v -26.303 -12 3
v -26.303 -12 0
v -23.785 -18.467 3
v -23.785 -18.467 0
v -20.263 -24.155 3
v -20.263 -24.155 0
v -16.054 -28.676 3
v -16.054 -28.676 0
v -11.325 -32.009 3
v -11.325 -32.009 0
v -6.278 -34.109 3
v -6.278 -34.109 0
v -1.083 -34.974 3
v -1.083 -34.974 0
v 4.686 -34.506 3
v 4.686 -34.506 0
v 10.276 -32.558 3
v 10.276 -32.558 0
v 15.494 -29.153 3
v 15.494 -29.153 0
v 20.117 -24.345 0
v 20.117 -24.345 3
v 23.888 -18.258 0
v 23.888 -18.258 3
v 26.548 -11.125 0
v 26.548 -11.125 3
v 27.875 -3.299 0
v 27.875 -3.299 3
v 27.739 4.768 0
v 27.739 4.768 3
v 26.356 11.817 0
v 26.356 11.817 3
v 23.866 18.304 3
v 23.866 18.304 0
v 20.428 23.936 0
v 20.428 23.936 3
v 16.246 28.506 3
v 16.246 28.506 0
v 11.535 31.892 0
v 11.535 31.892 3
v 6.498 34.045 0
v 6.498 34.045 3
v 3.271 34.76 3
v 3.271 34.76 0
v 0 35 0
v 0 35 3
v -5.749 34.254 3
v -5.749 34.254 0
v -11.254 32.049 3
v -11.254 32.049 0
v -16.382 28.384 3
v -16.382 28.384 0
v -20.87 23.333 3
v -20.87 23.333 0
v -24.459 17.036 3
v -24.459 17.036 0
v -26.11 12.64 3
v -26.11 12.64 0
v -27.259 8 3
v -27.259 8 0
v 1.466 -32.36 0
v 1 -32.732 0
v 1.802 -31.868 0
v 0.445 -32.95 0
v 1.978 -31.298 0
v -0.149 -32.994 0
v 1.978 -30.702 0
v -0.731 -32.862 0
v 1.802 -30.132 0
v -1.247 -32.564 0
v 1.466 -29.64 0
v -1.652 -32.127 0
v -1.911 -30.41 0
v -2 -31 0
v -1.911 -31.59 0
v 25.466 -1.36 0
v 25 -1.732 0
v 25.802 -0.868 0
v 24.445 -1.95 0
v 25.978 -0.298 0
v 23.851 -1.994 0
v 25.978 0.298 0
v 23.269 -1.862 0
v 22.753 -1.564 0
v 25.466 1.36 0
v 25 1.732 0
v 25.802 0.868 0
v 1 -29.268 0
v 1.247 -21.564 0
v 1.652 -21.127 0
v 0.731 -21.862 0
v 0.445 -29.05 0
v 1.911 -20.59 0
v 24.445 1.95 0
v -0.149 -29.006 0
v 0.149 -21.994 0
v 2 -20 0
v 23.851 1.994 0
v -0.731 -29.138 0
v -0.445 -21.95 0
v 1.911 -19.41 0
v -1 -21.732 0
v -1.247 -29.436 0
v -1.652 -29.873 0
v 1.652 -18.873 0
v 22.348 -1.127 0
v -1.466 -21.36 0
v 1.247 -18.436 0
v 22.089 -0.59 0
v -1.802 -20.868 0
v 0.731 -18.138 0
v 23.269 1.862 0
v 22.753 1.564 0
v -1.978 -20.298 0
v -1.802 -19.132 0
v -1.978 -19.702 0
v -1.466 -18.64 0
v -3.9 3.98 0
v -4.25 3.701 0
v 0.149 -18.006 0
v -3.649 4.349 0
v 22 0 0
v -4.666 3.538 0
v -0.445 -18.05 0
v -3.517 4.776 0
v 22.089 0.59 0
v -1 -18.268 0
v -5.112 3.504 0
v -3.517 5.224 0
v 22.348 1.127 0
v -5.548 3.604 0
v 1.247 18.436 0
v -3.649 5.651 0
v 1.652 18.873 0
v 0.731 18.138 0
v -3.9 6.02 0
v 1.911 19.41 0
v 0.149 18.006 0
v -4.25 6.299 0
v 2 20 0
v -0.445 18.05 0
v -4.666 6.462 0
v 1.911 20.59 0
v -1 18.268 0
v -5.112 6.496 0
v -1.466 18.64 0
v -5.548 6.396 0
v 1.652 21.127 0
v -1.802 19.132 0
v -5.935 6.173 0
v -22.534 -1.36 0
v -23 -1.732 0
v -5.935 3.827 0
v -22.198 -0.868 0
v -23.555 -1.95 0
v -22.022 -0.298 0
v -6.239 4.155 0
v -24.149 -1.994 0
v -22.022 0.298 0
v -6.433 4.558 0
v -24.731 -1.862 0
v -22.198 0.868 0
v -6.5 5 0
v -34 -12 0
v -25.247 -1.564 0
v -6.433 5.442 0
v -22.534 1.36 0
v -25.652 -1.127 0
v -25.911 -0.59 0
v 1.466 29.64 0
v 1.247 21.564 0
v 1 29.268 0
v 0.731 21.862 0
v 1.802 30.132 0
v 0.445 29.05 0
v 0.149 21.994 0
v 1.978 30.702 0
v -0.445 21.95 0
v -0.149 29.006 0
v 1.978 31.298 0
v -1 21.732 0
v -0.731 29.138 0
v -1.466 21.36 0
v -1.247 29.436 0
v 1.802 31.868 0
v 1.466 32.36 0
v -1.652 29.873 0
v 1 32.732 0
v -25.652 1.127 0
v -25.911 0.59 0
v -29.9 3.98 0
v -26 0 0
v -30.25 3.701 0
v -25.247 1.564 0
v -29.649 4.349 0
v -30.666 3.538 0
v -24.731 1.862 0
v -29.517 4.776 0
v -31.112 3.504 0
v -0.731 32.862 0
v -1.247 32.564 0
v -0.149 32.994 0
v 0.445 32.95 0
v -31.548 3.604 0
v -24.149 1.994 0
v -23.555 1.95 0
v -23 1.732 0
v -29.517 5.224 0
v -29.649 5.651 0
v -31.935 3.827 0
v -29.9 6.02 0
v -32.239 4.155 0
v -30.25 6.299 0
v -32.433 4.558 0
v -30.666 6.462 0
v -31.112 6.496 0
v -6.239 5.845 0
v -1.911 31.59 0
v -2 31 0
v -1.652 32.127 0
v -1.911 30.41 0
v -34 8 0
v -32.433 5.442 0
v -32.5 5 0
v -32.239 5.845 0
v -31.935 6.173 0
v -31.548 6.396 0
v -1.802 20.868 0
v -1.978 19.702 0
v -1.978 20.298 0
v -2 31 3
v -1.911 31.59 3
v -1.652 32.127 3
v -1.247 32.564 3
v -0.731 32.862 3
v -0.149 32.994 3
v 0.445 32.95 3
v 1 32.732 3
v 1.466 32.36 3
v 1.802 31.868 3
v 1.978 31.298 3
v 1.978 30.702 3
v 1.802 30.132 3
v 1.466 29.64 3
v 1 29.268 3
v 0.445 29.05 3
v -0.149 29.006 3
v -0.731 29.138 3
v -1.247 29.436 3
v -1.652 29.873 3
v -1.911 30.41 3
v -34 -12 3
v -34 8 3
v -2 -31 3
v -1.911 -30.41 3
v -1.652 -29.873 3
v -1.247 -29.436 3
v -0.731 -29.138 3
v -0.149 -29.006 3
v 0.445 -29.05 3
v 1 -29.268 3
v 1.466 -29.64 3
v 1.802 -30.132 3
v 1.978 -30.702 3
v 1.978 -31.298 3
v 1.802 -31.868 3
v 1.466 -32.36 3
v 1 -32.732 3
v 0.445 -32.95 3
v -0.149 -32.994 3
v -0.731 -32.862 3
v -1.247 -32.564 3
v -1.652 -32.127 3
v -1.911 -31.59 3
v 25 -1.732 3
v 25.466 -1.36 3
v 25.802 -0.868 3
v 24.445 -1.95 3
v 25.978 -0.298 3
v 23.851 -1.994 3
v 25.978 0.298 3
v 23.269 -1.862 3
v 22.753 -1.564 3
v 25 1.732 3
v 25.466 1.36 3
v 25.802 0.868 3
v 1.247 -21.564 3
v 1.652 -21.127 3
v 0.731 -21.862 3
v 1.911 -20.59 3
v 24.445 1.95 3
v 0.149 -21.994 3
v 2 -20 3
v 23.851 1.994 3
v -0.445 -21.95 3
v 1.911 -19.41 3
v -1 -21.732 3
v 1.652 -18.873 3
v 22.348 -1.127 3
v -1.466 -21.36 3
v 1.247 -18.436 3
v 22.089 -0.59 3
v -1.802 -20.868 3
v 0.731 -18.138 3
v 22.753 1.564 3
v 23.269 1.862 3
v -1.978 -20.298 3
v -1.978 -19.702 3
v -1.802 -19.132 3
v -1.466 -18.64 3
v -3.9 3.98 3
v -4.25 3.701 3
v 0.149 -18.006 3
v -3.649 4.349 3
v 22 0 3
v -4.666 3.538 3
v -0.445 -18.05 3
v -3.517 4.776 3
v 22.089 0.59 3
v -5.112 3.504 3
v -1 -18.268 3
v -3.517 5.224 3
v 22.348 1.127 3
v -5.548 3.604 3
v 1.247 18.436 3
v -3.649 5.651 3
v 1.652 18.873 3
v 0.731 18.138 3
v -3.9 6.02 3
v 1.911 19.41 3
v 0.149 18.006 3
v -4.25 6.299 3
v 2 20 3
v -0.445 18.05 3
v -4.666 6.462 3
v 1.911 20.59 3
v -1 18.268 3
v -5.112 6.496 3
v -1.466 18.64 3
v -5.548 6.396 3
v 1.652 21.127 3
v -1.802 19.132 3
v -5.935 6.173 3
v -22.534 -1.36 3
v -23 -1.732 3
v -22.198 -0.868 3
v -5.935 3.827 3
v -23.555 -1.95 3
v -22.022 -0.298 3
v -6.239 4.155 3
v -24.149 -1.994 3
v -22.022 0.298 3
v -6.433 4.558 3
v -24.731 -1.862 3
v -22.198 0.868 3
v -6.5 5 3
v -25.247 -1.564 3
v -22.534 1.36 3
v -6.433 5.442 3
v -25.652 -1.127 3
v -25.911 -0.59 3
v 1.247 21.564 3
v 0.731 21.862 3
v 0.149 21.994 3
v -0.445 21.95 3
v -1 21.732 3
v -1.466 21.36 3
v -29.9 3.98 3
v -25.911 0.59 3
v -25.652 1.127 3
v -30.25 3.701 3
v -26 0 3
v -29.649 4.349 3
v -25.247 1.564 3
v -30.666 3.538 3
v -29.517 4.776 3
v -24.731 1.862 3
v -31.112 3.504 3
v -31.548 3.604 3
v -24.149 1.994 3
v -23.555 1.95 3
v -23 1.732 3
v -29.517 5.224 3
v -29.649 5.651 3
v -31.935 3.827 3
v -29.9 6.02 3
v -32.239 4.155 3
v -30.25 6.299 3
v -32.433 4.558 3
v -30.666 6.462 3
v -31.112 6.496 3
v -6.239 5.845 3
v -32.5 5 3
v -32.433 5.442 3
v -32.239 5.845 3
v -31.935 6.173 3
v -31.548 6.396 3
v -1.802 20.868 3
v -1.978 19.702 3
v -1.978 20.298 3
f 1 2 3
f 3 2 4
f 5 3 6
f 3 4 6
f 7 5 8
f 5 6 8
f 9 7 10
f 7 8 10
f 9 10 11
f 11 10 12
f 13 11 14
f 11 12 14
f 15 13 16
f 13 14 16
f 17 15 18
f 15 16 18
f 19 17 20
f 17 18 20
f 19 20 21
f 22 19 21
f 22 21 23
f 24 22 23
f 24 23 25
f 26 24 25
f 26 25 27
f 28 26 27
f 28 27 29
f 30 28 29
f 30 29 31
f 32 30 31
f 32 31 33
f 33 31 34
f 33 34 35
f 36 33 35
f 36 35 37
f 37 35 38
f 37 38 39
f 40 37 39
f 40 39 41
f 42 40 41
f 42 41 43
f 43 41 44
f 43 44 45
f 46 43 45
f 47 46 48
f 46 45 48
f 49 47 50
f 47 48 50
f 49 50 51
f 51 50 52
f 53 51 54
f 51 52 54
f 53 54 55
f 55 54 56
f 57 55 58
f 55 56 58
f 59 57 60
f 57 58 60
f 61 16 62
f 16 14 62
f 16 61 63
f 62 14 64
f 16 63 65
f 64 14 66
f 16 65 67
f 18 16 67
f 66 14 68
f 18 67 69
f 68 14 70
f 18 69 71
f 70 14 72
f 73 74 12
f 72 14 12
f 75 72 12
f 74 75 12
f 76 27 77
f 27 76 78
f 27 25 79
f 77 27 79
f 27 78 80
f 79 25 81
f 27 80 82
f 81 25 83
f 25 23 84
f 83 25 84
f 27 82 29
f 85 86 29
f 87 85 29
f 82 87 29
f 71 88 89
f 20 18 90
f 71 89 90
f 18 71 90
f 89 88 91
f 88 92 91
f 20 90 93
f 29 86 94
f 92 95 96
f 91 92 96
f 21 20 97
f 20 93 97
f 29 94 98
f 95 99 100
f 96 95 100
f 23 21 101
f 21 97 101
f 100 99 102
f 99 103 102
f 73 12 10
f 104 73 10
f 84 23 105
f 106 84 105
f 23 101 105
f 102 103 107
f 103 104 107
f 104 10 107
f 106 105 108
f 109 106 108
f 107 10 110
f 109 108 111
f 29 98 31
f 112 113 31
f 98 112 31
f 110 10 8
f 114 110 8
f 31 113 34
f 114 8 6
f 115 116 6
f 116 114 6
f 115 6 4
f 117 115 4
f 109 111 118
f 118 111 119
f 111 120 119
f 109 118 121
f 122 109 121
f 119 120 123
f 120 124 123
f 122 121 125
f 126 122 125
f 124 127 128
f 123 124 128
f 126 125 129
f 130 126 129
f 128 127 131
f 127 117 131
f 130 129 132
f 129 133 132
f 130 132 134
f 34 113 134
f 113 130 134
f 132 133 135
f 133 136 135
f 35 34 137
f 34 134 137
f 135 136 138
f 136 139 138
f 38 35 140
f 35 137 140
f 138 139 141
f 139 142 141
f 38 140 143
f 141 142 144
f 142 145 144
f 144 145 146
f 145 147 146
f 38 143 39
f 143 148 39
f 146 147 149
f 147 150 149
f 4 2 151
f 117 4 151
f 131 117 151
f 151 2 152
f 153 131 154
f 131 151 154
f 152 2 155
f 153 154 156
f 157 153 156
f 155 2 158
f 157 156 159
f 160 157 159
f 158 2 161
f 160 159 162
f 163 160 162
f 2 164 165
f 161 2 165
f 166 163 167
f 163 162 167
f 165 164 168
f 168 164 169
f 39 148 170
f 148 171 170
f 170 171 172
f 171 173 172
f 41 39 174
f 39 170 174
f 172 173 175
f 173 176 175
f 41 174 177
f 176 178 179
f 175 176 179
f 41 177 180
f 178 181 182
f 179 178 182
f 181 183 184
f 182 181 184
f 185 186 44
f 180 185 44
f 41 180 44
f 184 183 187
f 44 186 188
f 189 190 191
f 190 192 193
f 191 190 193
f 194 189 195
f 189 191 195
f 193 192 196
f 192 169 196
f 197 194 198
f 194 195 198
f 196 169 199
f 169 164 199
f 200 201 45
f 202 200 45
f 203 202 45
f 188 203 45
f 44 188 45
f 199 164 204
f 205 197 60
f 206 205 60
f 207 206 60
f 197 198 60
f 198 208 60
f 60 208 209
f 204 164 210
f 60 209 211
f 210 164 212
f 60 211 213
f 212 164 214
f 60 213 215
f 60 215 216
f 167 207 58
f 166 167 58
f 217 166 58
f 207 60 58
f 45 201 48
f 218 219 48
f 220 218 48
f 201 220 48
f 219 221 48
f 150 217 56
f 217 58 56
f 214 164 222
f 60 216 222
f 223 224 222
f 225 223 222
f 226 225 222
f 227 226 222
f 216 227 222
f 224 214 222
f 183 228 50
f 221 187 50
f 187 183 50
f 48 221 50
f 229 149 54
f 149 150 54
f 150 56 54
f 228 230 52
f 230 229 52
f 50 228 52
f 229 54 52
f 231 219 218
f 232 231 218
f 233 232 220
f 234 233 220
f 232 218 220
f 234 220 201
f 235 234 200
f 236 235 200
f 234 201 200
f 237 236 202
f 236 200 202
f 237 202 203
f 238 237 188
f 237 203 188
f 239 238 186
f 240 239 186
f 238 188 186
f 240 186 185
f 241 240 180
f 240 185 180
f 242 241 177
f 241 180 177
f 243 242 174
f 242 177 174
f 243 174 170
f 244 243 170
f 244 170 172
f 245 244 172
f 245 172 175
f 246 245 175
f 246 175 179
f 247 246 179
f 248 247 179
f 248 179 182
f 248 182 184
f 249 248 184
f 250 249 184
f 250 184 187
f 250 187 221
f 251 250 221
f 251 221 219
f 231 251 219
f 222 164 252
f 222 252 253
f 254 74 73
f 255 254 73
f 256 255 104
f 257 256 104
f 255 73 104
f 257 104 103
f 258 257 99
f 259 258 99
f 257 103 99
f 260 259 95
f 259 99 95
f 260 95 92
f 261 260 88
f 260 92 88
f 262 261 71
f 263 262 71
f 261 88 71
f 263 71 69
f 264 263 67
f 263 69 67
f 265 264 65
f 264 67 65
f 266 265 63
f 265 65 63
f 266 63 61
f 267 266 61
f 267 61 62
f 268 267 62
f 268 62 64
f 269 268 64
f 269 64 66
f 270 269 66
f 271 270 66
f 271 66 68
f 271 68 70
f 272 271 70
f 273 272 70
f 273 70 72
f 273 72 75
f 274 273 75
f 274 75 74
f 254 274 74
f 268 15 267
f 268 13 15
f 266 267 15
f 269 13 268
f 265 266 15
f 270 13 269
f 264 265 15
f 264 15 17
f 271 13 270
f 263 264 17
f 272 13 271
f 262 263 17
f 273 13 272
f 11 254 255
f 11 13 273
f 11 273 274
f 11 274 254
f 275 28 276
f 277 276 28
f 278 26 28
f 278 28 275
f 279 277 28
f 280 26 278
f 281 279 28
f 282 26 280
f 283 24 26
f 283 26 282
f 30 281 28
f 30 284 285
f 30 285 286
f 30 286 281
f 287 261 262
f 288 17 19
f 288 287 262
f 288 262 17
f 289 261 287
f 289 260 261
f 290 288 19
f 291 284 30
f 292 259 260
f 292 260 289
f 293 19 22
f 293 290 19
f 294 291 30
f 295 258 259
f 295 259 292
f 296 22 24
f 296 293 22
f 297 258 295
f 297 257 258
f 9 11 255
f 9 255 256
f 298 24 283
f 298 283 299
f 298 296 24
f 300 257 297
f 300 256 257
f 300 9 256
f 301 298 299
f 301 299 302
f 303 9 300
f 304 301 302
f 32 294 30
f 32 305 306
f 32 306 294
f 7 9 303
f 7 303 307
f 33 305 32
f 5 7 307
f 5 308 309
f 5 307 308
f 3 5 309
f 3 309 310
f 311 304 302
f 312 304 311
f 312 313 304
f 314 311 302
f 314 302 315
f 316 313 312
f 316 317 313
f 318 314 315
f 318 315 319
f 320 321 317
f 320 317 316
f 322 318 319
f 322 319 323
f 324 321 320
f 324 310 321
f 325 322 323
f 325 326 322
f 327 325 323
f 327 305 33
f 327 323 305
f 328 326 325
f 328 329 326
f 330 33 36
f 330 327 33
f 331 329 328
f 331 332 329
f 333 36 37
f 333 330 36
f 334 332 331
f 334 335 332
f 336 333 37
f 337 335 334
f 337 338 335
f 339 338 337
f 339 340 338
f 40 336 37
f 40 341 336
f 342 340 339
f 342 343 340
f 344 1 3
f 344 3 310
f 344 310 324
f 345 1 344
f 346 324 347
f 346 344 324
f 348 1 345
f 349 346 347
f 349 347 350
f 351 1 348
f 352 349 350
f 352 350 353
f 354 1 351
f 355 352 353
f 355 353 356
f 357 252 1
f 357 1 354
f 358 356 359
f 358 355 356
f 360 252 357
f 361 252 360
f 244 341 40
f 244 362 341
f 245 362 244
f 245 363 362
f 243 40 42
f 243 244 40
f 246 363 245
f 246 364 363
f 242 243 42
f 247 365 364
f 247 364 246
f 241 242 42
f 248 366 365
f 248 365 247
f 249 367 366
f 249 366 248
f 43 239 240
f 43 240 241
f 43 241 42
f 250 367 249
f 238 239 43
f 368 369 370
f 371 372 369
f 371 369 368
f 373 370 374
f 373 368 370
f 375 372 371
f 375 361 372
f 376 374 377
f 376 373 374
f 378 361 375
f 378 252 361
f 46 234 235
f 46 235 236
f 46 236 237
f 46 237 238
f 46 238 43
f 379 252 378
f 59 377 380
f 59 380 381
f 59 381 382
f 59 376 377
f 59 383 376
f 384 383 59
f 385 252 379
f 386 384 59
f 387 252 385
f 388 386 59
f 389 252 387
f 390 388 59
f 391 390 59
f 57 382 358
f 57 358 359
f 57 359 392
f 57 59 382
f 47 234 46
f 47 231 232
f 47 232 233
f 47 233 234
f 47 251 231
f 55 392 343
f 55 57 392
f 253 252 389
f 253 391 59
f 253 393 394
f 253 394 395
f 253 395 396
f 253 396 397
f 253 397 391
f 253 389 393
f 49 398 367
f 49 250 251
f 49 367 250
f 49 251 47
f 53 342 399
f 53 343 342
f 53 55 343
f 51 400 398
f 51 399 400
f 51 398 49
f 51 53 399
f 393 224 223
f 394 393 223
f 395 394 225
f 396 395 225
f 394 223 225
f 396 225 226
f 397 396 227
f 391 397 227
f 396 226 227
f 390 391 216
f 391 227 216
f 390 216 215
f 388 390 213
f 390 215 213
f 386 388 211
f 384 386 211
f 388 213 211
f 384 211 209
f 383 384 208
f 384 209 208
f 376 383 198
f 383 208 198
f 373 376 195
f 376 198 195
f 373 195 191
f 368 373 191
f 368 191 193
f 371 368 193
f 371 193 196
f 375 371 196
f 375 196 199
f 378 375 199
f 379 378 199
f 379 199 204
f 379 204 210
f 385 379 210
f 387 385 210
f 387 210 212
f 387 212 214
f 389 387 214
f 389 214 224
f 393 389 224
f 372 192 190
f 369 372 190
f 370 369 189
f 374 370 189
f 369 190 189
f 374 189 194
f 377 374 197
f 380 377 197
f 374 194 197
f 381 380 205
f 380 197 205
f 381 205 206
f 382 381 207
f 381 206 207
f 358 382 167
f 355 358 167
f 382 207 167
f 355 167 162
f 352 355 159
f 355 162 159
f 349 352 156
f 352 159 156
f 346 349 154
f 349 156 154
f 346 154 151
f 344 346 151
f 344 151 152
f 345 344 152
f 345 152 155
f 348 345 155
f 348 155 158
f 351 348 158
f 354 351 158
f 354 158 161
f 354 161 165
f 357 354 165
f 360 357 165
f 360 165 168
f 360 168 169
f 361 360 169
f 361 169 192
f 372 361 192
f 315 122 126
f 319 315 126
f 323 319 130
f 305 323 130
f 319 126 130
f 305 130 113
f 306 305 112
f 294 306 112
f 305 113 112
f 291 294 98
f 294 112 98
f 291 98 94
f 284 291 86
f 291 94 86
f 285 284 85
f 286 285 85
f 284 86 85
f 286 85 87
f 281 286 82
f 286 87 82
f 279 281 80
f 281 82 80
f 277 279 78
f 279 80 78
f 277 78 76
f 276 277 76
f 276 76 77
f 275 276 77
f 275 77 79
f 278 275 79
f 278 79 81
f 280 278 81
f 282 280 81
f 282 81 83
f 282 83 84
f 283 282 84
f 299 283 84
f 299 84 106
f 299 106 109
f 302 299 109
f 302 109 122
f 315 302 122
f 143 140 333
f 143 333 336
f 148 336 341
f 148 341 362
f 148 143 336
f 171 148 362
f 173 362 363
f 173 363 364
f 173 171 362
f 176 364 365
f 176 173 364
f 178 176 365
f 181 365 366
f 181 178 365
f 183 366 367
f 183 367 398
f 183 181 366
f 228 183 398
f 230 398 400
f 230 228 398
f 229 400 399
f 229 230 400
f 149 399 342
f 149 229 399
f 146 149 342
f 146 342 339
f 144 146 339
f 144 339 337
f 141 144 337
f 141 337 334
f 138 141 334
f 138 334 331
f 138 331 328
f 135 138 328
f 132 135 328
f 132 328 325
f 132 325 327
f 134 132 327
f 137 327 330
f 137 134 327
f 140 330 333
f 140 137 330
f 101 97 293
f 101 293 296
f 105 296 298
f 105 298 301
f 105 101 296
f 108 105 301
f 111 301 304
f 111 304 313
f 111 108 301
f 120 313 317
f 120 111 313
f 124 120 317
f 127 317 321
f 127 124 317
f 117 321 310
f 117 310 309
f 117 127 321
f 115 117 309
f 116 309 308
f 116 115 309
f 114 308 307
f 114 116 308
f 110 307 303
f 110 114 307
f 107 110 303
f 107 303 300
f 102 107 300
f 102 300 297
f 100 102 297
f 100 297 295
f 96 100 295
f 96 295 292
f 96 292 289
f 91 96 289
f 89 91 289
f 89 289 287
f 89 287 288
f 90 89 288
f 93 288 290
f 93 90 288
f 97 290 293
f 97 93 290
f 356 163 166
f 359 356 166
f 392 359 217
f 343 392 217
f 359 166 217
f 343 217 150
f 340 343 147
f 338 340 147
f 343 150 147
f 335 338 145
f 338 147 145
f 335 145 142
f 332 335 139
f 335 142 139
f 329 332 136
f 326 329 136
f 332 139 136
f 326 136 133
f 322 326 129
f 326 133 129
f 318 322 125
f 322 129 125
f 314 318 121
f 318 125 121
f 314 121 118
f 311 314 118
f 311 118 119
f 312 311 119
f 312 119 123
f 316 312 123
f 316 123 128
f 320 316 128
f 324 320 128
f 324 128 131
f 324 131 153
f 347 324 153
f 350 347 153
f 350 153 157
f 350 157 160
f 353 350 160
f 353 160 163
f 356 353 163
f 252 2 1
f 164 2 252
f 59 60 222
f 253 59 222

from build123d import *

# Parameters (mm, degrees)
ESQUISSE1_RX            = 35
ESQUISSE1_RY            = 28
ESQUISSE1_R             = 2
BOSS_EXTRU_1_DEPTH      = 3
ESQUISSE2_R             = 2
ENL_V_MAT_EXTRU_1_DEPTH = 10
ESQUISSE4_W             = 8
ESQUISSE4_H             = 20
BOSS_EXTRU_2_DEPTH      = 3
ESQUISSE3_R             = 1.5
ENL_V_MAT_EXTRU_2_DEPTH = 10


with BuildPart() as part:
    # Esquisse1 → Boss.-Extru.1 (new body)
    with BuildSketch(Plane.XY):
        with Locations(Location((0, 0), (0, 0, 90))):
            Ellipse(ESQUISSE1_RX, ESQUISSE1_RY)
        with Locations((0, 20)):
            Circle(ESQUISSE1_R, mode=Mode.SUBTRACT)
        with Locations((0, -20)):
            Circle(ESQUISSE1_R, mode=Mode.SUBTRACT)
    extrude(amount=BOSS_EXTRU_1_DEPTH)

    # Esquisse2 → Enlèv. mat.-Extru.1 (cut)
    with BuildSketch(Plane(origin=(0, 0, 0), x_dir=(-1, 0, 0), z_dir=(0, 0, -1))):
        with Locations((24, 0)):
            Circle(ESQUISSE2_R)
        with Locations((-24, 0)):
            Circle(ESQUISSE2_R)
        with Locations((0, 31)):
            Circle(ESQUISSE2_R)
        with Locations((0, -31)):
            Circle(ESQUISSE2_R)
    extrude(amount=-ENL_V_MAT_EXTRU_1_DEPTH, mode=Mode.SUBTRACT)

    # Esquisse4 → Boss.-Extru.2 (add)
    with BuildSketch(Plane(origin=(0, 0, 0), x_dir=(-1, 0, 0), z_dir=(0, 0, -1))):
        with Locations((30, -2)):
            Rectangle(ESQUISSE4_W, ESQUISSE4_H)
    extrude(amount=-BOSS_EXTRU_2_DEPTH)

    # Esquisse3 → Enlèv. mat.-Extru.2 (cut)
    with BuildSketch(Plane(origin=(0, 0, 0), x_dir=(-1, 0, 0), z_dir=(0, 0, -1))):
        with Locations((5, 5)):
            Circle(ESQUISSE3_R)
        with Locations((31, 5)):
            Circle(ESQUISSE3_R)
    extrude(amount=-ENL_V_MAT_EXTRU_2_DEPTH, mode=Mode.SUBTRACT)


solid = part.part
